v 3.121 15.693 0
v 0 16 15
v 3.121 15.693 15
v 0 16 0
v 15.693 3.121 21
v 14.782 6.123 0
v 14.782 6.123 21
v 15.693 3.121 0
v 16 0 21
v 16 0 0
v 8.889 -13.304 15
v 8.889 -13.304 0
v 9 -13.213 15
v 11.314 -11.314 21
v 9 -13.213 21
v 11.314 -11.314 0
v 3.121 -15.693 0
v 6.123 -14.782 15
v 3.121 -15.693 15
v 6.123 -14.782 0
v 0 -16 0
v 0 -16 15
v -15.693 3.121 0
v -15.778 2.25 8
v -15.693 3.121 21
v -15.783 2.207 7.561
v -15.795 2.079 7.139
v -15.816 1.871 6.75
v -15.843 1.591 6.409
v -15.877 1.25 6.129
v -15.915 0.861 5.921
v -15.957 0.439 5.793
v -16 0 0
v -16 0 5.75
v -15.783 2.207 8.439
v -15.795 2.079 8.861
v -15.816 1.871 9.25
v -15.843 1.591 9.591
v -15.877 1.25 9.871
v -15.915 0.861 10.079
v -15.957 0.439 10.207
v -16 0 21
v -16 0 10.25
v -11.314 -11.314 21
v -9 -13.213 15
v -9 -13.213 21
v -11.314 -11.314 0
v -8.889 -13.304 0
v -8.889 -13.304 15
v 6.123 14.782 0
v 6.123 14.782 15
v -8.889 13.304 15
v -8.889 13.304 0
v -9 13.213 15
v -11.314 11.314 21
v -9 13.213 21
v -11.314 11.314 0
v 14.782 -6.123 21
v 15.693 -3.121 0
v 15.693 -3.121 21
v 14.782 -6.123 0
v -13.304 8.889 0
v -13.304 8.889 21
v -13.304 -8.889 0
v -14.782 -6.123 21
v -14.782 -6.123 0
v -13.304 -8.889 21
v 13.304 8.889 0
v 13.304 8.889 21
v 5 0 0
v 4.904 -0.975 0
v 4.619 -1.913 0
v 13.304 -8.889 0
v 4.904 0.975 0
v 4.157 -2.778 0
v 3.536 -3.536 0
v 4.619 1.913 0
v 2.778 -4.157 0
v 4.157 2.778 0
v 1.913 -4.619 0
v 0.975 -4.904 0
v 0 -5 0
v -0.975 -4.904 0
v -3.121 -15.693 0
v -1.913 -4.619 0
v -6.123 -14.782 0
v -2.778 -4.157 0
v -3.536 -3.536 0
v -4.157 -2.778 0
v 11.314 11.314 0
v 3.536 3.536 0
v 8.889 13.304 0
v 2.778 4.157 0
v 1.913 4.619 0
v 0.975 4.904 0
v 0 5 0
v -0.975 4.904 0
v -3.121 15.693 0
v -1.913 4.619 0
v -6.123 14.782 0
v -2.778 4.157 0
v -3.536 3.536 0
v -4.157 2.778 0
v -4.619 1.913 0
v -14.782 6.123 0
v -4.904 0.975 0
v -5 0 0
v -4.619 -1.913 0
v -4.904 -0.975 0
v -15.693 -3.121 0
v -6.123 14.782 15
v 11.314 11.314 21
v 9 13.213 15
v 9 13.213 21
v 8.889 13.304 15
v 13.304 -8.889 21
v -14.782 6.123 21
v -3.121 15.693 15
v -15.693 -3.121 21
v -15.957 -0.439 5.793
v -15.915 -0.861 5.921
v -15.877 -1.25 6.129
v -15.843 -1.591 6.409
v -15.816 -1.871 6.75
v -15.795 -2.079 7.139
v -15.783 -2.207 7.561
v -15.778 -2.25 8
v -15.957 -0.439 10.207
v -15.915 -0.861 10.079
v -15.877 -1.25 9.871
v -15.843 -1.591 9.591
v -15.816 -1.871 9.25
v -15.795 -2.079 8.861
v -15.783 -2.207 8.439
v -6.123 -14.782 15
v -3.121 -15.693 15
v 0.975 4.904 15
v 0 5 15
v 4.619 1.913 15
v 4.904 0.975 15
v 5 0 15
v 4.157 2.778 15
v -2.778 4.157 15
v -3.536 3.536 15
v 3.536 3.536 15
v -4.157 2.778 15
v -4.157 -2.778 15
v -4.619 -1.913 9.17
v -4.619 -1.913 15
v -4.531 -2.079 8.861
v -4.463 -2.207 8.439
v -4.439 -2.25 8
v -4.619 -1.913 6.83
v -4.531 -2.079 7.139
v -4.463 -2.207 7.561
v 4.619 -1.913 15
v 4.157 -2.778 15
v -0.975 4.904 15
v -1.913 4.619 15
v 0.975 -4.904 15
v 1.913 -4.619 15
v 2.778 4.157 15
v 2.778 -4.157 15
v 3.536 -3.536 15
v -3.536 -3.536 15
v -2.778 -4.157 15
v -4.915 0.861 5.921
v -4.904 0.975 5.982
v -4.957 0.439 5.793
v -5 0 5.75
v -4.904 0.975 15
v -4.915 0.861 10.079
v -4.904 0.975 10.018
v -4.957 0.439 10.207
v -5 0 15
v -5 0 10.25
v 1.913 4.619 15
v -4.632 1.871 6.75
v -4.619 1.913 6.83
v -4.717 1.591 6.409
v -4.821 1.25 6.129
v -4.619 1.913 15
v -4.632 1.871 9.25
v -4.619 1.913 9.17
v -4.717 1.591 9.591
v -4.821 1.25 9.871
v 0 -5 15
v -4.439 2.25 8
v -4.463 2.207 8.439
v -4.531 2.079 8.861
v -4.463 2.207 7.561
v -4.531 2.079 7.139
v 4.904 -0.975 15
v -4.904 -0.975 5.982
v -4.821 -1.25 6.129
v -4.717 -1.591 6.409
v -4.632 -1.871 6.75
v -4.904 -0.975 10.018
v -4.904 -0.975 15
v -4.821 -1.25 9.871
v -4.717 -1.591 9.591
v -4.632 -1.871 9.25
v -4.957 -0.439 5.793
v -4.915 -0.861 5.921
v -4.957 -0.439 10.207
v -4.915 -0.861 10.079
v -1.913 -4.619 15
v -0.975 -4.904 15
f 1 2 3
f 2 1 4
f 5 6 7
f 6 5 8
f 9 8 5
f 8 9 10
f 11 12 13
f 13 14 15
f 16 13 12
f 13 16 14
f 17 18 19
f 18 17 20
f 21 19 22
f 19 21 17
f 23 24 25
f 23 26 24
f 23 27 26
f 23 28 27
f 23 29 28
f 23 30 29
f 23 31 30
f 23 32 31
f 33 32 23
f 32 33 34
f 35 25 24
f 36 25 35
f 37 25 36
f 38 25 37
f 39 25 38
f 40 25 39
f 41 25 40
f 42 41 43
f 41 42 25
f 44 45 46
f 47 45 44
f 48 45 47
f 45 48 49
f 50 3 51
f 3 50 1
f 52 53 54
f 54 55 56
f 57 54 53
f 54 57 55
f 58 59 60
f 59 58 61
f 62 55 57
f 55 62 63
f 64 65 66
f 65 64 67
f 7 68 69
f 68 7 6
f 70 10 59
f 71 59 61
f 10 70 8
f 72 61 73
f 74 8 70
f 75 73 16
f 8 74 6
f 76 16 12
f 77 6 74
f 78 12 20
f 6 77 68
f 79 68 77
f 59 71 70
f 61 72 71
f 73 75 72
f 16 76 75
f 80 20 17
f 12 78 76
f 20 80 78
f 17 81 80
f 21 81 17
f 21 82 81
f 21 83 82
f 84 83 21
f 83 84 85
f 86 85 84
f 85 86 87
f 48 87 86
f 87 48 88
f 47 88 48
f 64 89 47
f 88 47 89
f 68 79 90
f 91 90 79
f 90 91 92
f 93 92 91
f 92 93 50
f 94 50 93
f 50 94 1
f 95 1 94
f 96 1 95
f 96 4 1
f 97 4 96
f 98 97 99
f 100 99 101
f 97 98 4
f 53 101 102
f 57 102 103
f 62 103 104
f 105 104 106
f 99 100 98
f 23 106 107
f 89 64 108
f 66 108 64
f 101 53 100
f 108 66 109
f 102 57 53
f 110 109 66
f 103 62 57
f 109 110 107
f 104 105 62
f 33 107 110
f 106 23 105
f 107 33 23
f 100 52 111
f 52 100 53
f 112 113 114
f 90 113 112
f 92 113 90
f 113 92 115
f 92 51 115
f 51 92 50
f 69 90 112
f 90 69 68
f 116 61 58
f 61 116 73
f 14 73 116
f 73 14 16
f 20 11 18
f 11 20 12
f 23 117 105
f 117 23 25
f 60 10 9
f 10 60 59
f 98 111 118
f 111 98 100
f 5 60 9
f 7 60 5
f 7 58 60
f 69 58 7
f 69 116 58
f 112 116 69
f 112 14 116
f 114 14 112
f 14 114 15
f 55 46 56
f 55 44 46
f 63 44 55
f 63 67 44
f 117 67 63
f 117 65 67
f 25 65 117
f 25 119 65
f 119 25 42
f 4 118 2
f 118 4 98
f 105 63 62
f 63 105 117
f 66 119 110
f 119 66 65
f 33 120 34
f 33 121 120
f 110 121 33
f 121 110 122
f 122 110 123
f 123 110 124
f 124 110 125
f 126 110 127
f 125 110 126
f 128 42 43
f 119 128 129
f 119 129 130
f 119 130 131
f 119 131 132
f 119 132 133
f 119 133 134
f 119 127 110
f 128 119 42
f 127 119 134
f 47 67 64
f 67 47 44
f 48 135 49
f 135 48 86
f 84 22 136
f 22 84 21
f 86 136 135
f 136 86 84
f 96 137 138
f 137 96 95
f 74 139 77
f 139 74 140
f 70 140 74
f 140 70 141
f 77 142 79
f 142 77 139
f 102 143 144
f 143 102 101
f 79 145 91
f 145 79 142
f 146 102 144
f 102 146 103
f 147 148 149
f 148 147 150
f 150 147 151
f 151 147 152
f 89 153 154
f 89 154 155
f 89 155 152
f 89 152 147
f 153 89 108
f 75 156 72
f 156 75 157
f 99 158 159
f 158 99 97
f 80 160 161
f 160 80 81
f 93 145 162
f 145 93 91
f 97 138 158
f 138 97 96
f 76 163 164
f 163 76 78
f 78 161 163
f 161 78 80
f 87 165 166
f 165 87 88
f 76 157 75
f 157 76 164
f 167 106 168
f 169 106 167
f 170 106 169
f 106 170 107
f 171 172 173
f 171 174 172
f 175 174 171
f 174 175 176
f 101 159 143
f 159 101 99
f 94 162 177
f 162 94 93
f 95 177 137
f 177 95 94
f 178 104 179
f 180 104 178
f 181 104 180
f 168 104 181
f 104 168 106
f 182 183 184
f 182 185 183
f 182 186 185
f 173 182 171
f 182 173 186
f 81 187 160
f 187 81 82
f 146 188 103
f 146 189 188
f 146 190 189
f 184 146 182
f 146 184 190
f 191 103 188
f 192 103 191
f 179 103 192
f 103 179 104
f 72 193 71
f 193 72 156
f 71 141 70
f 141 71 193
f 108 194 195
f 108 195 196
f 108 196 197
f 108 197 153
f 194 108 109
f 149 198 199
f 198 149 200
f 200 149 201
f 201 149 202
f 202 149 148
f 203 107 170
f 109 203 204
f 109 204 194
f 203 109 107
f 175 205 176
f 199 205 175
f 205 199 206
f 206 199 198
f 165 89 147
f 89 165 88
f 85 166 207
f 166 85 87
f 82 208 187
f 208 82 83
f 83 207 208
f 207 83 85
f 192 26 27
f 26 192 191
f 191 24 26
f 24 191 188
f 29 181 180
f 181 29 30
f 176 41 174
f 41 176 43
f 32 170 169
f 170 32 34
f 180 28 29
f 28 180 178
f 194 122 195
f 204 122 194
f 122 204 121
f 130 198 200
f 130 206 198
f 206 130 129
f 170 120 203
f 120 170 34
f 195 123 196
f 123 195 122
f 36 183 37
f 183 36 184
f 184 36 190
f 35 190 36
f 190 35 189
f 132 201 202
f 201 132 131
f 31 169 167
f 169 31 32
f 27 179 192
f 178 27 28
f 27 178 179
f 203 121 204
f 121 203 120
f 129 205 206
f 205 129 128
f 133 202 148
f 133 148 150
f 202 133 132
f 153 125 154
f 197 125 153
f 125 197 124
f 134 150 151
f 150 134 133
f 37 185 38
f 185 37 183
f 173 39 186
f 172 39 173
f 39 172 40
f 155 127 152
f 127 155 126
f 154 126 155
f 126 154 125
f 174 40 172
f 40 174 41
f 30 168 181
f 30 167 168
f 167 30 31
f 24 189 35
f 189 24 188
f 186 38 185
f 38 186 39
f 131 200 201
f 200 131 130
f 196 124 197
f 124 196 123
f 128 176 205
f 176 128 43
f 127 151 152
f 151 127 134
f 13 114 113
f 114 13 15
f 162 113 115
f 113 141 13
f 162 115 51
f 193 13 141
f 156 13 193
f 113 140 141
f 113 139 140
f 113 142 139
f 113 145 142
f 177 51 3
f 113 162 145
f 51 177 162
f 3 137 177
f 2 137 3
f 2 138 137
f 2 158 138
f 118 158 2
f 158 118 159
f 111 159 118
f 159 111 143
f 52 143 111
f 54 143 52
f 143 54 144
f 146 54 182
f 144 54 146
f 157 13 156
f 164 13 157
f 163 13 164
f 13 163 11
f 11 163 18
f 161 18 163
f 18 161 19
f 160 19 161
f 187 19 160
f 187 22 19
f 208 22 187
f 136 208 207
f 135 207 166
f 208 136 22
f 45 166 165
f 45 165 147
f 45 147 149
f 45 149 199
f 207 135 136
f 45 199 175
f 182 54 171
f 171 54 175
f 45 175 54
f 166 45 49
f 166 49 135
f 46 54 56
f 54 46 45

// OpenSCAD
$fn = 32;

// ----------------------------------------------------------------------
// Oldham coupling hub: 32 x 21 mm
// ----------------------------------------------------------------------

// --- parameters (mm) ---
body_d = 32;              // hub diameter
body_l = 16;              // hub length
shaft_d = 10;             // shaft bore
cam_w = 18;               // drive tongue width
tongue_h = 5;             // drive tongue height
set_d = 4.5;              // set screw tap hole

module hub() {
  /* the slot side is a raised disc with a groove milled across it */
  cylinder(h = body_l + tongue_h, d = body_d);
}

difference() {
  hub();
  translate([0, 0, -1]) cylinder(h = body_l + tongue_h + 2, d = shaft_d);
  translate([-body_d / 2 - 1, 0, body_l * 0.5])
    rotate([0, 90, 0]) cylinder(h = body_d / 2 + 2, d = set_d);
  translate([-cam_w / 2, -body_d / 2 - 1, body_l - 1])
    cube([cam_w, body_d + 2, tongue_h + 1]);
}
